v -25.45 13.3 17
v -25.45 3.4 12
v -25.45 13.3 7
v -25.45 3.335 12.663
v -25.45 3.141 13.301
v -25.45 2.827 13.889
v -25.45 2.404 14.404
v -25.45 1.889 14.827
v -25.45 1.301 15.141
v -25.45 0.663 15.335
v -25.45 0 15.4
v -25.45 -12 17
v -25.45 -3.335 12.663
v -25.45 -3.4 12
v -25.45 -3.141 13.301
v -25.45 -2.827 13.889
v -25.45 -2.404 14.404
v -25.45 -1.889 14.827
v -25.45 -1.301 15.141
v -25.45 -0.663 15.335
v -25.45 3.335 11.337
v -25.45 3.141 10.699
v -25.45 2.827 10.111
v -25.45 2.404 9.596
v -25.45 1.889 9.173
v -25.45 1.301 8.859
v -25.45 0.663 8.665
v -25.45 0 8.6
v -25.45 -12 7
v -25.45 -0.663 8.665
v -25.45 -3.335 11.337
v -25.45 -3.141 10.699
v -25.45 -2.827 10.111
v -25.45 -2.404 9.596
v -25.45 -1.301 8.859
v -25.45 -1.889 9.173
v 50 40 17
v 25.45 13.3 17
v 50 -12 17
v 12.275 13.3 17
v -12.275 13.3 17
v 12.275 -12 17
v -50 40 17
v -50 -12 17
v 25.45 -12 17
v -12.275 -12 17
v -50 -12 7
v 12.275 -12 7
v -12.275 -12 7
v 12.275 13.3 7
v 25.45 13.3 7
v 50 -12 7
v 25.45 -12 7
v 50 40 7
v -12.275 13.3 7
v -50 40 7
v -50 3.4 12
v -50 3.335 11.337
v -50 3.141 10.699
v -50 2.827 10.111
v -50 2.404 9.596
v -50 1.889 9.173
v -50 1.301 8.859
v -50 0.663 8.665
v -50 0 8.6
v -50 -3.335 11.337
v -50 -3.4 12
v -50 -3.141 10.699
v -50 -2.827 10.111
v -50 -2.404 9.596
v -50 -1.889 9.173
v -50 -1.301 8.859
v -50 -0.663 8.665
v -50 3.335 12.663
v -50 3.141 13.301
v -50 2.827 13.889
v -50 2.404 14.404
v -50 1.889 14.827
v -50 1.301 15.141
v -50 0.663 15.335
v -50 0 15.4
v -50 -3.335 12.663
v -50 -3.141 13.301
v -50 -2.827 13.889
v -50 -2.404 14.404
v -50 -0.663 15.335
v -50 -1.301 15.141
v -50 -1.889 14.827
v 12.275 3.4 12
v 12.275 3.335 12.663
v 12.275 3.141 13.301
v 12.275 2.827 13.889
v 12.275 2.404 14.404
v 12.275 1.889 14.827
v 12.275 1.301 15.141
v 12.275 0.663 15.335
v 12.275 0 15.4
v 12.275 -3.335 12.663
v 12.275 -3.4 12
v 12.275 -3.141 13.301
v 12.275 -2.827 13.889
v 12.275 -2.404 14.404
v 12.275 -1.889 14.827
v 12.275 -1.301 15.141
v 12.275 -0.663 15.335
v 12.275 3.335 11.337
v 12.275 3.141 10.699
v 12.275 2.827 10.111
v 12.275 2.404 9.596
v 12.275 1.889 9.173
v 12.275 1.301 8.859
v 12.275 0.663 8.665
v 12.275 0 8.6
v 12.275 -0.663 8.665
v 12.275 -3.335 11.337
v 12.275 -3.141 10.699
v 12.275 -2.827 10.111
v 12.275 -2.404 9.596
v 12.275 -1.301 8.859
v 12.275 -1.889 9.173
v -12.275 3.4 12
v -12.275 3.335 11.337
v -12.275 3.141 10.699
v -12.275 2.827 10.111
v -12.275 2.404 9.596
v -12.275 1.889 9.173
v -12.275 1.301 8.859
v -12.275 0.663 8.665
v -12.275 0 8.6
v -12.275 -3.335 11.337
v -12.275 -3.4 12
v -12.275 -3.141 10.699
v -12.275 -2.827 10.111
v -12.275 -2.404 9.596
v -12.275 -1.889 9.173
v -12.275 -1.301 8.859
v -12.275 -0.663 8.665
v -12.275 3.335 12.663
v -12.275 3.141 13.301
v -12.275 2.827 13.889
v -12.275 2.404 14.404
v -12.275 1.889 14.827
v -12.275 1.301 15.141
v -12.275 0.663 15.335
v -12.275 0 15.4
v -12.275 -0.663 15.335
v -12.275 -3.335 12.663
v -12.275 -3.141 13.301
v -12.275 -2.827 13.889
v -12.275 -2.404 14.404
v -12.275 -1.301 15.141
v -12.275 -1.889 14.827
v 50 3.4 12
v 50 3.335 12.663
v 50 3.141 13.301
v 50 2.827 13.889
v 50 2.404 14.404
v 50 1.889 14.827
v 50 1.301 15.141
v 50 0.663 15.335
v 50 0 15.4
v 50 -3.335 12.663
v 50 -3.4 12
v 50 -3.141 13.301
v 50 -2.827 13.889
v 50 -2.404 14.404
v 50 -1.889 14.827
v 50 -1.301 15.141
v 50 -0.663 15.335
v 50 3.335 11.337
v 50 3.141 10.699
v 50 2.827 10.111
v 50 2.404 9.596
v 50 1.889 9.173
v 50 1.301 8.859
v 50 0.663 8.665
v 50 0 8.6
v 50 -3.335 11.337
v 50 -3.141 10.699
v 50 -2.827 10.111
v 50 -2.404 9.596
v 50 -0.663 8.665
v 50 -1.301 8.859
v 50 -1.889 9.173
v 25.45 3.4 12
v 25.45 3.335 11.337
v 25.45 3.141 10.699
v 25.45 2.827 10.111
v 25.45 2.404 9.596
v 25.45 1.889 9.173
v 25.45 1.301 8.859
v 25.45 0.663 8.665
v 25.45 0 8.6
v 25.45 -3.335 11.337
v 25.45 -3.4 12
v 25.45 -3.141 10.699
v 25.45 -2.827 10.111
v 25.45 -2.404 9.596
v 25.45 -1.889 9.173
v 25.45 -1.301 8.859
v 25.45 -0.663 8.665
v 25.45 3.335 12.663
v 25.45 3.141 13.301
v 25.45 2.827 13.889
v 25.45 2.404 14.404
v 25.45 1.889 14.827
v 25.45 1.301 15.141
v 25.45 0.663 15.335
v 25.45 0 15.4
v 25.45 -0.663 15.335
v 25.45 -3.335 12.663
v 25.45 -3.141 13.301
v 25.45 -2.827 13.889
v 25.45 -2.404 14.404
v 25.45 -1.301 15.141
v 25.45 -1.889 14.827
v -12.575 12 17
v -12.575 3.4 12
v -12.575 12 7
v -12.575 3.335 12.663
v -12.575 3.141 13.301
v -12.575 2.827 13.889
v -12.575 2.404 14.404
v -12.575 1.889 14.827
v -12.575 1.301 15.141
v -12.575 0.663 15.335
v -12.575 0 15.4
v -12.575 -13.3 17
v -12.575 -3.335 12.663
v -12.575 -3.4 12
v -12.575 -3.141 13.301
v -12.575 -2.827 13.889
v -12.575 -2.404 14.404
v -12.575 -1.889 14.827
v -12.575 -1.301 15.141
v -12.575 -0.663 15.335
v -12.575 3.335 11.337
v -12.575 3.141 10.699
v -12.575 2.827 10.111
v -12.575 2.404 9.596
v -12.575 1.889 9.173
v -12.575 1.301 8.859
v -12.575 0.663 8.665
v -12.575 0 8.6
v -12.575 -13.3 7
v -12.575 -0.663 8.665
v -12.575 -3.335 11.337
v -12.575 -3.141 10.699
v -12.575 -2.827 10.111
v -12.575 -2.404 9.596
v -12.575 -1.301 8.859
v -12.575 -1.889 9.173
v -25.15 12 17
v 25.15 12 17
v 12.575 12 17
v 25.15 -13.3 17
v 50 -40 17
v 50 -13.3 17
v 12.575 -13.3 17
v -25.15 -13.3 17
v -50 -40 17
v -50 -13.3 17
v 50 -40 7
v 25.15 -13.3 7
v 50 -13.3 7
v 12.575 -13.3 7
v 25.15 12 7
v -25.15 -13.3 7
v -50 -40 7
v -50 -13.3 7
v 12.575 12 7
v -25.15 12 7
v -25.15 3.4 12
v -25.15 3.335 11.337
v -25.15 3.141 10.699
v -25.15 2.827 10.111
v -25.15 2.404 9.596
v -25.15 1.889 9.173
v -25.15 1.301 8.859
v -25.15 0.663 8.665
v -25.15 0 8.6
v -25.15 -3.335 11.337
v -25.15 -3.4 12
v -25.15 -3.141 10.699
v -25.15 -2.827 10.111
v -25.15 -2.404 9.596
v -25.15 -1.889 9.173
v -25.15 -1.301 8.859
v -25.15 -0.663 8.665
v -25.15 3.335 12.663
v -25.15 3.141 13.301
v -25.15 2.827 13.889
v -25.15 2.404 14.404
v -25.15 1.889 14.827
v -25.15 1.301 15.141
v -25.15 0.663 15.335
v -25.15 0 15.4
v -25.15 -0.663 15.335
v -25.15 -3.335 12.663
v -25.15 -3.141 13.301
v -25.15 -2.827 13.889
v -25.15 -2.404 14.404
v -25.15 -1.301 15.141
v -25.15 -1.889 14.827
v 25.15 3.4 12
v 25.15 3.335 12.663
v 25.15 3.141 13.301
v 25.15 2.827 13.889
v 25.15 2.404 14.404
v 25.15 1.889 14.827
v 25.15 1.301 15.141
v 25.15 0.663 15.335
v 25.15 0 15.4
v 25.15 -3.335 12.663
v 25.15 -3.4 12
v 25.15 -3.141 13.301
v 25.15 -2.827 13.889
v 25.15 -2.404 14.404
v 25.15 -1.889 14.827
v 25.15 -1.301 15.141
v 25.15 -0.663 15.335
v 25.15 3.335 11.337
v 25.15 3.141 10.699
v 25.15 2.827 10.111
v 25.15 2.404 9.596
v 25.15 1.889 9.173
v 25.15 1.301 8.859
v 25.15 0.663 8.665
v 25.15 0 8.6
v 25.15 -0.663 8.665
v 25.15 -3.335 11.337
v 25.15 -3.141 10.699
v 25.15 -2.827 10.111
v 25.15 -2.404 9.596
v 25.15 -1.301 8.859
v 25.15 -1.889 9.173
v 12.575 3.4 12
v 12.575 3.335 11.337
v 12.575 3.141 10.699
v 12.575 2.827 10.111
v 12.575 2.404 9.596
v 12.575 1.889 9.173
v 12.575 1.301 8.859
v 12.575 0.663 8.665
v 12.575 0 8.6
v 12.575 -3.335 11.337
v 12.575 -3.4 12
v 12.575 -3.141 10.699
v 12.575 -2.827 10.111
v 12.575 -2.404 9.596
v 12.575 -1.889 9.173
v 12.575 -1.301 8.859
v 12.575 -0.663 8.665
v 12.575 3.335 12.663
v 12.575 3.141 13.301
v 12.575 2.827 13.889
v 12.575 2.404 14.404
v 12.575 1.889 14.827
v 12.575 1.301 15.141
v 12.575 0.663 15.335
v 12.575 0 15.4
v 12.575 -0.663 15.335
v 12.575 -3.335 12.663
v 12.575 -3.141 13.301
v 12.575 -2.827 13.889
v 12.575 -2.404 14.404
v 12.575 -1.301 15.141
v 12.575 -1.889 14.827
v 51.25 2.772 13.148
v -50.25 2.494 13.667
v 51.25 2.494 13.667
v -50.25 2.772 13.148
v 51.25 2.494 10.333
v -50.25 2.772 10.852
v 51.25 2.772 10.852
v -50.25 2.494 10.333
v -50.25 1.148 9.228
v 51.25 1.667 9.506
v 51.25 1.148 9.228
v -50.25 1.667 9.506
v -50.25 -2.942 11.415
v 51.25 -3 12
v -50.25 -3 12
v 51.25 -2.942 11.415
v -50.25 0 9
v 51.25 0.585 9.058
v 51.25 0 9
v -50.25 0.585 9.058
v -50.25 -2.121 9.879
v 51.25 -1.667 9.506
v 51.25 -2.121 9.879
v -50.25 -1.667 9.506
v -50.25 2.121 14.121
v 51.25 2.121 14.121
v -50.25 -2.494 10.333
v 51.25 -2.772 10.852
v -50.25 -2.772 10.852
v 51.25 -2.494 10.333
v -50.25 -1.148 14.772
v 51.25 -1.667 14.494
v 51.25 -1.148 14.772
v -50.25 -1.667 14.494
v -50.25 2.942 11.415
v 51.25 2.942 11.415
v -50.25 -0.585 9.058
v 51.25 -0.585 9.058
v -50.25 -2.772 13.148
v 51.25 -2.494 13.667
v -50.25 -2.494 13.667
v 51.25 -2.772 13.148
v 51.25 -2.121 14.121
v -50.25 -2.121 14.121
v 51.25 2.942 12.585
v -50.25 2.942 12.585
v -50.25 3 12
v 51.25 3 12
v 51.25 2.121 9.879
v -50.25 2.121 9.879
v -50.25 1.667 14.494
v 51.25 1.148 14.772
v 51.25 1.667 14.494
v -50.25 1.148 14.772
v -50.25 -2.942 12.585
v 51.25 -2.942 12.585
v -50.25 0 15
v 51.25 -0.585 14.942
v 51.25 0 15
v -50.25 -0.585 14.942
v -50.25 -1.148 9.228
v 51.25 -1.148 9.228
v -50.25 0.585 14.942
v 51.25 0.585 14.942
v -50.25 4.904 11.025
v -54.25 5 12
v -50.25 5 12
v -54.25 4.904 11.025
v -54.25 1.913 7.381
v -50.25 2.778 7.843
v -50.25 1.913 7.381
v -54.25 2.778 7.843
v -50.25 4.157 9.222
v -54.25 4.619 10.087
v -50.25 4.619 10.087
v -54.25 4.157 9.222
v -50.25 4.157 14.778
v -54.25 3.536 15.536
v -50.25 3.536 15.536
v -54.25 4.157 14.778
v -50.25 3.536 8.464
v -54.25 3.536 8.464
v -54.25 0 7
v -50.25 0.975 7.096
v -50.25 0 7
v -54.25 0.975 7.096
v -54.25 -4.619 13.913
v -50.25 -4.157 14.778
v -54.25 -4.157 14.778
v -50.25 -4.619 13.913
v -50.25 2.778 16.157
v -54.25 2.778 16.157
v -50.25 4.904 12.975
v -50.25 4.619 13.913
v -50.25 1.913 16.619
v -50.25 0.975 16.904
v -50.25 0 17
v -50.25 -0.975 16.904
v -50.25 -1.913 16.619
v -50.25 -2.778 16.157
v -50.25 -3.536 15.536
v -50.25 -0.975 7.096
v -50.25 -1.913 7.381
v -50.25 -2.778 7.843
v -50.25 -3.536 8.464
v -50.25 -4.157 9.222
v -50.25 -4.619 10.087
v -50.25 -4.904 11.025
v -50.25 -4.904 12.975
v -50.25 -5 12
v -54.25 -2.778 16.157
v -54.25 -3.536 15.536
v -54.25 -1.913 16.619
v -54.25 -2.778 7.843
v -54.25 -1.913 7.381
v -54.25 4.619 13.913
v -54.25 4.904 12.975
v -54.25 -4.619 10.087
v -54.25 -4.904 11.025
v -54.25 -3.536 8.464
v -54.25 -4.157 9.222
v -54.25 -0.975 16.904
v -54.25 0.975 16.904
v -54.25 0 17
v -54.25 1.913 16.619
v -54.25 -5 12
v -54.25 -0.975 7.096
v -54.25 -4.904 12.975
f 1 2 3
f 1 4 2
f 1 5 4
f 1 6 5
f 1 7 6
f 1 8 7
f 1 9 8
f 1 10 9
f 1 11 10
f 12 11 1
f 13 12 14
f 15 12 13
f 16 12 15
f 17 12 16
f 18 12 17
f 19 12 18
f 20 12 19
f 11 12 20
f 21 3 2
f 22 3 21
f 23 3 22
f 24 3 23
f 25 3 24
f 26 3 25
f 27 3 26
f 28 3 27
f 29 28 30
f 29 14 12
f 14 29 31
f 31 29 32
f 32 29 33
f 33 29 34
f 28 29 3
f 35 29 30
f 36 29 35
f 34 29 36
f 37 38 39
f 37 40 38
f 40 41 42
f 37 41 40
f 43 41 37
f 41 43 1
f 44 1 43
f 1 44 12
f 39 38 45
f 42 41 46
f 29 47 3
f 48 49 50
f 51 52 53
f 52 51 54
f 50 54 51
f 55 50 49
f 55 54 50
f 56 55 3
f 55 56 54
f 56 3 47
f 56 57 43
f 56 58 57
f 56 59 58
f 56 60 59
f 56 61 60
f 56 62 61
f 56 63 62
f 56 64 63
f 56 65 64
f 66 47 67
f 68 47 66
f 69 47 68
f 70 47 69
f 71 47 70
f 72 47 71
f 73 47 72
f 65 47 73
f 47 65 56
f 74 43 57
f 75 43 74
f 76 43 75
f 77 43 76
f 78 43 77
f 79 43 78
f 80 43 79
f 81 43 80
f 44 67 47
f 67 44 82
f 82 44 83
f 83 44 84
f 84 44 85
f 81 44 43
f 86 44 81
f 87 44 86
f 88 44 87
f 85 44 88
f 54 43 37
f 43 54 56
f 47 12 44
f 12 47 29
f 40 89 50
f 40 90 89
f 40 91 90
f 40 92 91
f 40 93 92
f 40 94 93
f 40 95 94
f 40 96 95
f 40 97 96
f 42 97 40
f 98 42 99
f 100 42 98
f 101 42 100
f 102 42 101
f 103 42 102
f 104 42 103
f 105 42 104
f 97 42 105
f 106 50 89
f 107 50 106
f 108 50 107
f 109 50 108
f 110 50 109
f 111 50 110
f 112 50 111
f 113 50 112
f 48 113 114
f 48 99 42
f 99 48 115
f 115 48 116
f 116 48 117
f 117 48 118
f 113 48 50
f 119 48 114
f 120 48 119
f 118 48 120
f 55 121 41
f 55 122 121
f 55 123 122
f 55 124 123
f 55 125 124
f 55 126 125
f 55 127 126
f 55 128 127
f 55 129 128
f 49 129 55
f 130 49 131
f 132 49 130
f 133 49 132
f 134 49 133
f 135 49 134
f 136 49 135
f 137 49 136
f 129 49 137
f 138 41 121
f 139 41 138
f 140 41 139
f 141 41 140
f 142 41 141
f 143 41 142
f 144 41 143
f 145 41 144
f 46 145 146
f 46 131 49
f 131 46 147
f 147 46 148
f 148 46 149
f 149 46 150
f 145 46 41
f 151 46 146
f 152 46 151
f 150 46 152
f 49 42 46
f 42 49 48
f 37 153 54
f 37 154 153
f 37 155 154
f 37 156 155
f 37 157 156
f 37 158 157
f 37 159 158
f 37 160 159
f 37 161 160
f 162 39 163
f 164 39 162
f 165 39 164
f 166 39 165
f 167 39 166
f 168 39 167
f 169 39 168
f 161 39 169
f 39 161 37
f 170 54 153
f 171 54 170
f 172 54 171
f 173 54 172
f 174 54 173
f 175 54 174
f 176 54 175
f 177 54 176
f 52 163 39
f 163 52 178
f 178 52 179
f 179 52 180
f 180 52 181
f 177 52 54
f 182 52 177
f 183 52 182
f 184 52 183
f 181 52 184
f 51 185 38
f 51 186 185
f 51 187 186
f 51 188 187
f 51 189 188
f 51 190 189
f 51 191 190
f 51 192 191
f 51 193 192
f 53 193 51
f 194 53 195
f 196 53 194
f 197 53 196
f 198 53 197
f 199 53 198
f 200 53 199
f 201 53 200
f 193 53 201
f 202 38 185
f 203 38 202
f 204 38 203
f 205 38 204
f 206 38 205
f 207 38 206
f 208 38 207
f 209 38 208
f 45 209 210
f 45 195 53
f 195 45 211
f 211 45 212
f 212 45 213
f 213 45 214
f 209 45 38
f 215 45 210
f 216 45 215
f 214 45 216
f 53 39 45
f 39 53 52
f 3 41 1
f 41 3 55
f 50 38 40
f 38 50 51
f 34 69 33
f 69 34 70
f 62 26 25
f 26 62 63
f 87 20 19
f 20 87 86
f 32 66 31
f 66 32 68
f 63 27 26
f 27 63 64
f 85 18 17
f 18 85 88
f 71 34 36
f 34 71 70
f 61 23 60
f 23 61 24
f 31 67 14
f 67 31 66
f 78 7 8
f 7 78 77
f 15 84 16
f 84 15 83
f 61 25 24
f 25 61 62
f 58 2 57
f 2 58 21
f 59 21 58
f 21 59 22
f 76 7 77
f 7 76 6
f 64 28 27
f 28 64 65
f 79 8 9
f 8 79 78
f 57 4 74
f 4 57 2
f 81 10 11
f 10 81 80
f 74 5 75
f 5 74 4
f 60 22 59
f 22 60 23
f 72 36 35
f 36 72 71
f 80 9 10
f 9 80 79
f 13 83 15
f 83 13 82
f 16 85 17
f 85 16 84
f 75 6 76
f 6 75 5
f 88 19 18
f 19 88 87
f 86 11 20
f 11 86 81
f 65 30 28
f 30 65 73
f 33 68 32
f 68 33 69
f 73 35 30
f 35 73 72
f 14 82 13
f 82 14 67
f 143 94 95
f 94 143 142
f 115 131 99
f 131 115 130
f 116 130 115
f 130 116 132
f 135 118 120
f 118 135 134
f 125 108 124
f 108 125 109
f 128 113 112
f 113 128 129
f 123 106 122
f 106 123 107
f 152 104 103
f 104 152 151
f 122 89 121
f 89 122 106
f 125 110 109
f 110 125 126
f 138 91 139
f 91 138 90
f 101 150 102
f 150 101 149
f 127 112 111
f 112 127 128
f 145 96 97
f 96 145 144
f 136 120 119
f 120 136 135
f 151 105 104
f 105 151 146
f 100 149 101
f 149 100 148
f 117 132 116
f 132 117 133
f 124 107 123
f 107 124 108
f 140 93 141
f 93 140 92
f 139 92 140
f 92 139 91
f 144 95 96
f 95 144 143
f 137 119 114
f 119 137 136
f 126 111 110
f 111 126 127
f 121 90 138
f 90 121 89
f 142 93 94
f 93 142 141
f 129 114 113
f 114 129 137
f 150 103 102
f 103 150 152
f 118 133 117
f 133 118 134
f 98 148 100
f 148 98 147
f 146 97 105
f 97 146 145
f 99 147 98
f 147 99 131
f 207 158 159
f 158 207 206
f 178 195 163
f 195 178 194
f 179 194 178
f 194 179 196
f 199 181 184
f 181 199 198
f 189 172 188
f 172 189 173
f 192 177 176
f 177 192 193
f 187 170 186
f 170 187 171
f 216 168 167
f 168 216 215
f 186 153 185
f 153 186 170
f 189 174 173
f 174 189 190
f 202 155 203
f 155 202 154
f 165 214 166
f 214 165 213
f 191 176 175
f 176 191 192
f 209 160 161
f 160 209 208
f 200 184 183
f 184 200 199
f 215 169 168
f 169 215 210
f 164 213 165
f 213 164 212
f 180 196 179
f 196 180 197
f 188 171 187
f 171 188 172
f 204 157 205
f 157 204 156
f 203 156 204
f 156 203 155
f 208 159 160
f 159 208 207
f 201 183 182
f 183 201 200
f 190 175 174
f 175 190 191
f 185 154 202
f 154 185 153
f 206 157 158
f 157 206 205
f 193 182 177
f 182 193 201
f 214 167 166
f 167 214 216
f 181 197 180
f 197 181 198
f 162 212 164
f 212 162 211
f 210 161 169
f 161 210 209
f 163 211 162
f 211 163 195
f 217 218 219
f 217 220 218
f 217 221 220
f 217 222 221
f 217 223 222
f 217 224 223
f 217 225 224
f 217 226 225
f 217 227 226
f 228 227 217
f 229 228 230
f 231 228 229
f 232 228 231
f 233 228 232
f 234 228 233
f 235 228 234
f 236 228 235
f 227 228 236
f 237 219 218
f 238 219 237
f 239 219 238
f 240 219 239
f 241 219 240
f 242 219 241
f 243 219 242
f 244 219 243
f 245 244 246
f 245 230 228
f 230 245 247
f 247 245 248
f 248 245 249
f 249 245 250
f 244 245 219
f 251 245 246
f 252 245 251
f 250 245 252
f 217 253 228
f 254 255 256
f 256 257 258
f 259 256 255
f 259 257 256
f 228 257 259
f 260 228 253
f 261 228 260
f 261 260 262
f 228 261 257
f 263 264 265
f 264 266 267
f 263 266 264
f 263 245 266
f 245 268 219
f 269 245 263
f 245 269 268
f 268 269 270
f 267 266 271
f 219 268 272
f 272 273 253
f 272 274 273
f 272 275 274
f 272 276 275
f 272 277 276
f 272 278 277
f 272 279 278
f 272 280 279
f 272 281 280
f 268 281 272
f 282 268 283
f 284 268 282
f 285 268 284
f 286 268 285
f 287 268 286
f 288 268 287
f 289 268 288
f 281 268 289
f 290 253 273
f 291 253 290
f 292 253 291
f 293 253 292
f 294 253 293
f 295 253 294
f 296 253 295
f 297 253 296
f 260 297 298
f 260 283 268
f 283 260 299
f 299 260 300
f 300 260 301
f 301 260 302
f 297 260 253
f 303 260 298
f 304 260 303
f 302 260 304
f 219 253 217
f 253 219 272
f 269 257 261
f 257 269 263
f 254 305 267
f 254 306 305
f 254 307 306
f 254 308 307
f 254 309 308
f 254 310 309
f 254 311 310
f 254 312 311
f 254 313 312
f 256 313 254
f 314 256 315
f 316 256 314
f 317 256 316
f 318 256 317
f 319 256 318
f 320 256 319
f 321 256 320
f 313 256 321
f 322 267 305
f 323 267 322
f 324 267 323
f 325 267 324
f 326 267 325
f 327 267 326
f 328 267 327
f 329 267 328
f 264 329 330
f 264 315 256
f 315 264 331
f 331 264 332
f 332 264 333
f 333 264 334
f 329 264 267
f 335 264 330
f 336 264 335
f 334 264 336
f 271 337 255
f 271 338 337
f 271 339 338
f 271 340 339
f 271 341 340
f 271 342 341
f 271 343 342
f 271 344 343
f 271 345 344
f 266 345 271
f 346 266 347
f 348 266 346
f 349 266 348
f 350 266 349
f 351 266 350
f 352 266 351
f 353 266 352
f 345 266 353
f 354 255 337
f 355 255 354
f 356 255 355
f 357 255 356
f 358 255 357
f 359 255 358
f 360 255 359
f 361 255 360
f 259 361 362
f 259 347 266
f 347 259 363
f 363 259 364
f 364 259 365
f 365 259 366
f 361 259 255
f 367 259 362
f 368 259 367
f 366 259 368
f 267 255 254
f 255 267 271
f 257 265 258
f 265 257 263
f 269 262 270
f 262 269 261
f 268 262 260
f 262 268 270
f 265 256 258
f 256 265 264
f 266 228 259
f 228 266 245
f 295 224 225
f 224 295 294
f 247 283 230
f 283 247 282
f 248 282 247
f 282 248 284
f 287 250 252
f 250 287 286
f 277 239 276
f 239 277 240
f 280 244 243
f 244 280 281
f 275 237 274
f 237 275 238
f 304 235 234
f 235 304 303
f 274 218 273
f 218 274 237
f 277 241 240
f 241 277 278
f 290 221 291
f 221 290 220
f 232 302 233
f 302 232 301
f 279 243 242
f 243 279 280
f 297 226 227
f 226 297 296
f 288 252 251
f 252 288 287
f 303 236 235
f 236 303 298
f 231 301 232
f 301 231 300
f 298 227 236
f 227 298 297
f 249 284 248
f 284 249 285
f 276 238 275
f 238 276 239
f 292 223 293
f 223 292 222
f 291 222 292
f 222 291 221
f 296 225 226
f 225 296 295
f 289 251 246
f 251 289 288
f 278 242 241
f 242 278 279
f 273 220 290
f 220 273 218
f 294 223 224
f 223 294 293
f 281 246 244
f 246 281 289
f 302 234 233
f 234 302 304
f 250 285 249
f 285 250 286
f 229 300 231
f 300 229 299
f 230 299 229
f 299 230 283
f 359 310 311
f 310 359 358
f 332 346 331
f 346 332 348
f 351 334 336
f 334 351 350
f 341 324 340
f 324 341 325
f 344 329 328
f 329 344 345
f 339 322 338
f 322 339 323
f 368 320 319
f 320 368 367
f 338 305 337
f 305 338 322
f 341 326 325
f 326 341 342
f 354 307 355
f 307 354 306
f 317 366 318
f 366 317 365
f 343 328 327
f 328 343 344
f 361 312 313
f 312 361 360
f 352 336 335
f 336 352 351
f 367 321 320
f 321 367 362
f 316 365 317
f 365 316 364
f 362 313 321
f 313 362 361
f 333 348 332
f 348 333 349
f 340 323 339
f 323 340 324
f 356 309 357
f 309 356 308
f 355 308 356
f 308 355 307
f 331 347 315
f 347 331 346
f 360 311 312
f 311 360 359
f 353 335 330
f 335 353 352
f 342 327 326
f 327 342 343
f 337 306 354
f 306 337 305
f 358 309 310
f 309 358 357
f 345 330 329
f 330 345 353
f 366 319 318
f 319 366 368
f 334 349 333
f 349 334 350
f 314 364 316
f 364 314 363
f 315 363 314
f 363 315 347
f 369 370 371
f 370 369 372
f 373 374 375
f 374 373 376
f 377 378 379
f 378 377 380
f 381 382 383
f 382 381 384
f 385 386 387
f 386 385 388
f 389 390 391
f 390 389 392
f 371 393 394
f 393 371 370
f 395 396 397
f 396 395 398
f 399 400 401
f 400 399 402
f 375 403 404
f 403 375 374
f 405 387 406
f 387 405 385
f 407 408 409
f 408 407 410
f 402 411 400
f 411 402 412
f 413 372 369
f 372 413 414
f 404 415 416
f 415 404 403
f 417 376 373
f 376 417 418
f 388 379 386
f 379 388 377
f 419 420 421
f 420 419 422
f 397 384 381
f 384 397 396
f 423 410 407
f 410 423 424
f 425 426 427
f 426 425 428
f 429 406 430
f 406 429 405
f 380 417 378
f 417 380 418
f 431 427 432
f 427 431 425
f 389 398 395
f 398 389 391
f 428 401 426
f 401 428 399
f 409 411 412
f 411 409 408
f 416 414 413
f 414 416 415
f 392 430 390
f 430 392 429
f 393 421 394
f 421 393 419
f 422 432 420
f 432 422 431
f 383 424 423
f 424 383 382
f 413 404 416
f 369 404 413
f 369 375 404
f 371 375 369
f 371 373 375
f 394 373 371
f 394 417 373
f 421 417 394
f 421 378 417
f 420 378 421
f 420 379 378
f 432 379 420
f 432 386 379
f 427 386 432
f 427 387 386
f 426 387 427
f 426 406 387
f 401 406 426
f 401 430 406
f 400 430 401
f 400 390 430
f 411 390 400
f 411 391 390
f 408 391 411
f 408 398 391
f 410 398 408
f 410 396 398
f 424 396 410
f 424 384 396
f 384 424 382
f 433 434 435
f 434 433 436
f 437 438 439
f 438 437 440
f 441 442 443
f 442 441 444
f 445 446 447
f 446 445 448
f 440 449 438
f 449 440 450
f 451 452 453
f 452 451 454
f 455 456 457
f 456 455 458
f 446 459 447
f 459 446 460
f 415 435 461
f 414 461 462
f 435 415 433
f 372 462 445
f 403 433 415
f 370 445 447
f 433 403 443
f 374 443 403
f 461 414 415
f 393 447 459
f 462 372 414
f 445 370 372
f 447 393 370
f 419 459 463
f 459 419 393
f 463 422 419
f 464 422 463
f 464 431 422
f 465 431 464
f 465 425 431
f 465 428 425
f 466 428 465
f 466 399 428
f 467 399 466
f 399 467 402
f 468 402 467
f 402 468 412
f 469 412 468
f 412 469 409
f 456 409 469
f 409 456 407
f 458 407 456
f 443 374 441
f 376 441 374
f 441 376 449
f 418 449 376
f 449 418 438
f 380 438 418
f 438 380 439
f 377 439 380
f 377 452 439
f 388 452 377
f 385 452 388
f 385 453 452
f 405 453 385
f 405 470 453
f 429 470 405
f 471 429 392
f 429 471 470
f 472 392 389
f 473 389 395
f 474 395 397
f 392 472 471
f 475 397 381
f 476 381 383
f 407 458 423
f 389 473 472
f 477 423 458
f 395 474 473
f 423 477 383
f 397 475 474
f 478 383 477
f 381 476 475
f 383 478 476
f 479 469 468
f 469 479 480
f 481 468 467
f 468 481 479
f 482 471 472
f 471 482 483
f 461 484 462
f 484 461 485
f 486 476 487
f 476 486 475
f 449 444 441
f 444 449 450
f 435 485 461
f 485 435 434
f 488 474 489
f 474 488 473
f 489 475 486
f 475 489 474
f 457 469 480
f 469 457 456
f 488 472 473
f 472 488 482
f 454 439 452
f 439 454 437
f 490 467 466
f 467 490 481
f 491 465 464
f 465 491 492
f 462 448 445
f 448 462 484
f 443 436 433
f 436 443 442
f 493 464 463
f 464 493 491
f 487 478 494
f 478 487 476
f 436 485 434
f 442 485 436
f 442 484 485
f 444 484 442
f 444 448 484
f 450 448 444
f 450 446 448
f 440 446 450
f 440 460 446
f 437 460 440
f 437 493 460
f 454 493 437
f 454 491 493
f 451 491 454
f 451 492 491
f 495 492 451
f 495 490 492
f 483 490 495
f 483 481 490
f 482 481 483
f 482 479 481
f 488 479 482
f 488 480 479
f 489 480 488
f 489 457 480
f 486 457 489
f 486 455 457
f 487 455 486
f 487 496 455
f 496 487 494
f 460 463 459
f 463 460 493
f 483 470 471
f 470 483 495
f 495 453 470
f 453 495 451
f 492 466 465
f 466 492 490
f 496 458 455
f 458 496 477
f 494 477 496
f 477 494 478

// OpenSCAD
$fn = 32;

// ------------------------------------------------------------------------
// Butt hinge: hinge 100 mm, leaf swung 0 deg
// Every part is its own module, assembly() places every instance.
// ------------------------------------------------------------------------

// --- part 1 ---
module hinge_base() {
  difference() {
    union() {
      translate([-50, -12, -5]) cube([24.55, 52, 10]);
      translate([-12.275, -12, -5]) cube([24.55, 52, 10]);
      translate([25.45, -12, -5]) cube([24.55, 52, 10]);
      translate([-50, 13.3, -5]) cube([100, 26.7, 10]);
    }
    translate([-37.725, 0, 0]) rotate([0, 90, 0]) cylinder(h = 26.55, d = 6.8, center = true);
    translate([0, 0, 0]) rotate([0, 90, 0]) cylinder(h = 26.55, d = 6.8, center = true);
    translate([37.725, 0, 0]) rotate([0, 90, 0]) cylinder(h = 26.55, d = 6.8, center = true);
  }
}

// --- part 2 ---
module hinge_mover() {
  difference() {
    union() {
      translate([-25.15, -40, -5]) cube([12.575, 52, 10]);
      translate([12.575, -40, -5]) cube([12.575, 52, 10]);
      translate([-50, -40, -5]) cube([100, 26.7, 10]);
    }
    translate([-18.863, 0, 0]) rotate([0, 90, 0]) cylinder(h = 14.575, d = 6.8, center = true);
    translate([18.863, 0, 0]) rotate([0, 90, 0]) cylinder(h = 14.575, d = 6.8, center = true);
  }
}

// --- part 3 ---
module hinge_pin() {
  rotate([0, 90, 0]) cylinder(h = 102.5, d = 6, center = true);
  translate([-54.25, 0, 0]) rotate([0, 90, 0]) cylinder(h = 4, d = 10);
}

// --- assembly ---
module assembly() {
  color([0.80, 0.24, 0.20]) translate([0, 0, 12]) rotate([0, 0, 0]) hinge_base();
  color([0.20, 0.45, 0.75]) translate([0, 0, 12]) rotate([0, 0, 0]) hinge_mover();
  color([0.25, 0.62, 0.32]) translate([0, 0, 12]) rotate([0, 0, 0]) hinge_pin();
}

assembly();
